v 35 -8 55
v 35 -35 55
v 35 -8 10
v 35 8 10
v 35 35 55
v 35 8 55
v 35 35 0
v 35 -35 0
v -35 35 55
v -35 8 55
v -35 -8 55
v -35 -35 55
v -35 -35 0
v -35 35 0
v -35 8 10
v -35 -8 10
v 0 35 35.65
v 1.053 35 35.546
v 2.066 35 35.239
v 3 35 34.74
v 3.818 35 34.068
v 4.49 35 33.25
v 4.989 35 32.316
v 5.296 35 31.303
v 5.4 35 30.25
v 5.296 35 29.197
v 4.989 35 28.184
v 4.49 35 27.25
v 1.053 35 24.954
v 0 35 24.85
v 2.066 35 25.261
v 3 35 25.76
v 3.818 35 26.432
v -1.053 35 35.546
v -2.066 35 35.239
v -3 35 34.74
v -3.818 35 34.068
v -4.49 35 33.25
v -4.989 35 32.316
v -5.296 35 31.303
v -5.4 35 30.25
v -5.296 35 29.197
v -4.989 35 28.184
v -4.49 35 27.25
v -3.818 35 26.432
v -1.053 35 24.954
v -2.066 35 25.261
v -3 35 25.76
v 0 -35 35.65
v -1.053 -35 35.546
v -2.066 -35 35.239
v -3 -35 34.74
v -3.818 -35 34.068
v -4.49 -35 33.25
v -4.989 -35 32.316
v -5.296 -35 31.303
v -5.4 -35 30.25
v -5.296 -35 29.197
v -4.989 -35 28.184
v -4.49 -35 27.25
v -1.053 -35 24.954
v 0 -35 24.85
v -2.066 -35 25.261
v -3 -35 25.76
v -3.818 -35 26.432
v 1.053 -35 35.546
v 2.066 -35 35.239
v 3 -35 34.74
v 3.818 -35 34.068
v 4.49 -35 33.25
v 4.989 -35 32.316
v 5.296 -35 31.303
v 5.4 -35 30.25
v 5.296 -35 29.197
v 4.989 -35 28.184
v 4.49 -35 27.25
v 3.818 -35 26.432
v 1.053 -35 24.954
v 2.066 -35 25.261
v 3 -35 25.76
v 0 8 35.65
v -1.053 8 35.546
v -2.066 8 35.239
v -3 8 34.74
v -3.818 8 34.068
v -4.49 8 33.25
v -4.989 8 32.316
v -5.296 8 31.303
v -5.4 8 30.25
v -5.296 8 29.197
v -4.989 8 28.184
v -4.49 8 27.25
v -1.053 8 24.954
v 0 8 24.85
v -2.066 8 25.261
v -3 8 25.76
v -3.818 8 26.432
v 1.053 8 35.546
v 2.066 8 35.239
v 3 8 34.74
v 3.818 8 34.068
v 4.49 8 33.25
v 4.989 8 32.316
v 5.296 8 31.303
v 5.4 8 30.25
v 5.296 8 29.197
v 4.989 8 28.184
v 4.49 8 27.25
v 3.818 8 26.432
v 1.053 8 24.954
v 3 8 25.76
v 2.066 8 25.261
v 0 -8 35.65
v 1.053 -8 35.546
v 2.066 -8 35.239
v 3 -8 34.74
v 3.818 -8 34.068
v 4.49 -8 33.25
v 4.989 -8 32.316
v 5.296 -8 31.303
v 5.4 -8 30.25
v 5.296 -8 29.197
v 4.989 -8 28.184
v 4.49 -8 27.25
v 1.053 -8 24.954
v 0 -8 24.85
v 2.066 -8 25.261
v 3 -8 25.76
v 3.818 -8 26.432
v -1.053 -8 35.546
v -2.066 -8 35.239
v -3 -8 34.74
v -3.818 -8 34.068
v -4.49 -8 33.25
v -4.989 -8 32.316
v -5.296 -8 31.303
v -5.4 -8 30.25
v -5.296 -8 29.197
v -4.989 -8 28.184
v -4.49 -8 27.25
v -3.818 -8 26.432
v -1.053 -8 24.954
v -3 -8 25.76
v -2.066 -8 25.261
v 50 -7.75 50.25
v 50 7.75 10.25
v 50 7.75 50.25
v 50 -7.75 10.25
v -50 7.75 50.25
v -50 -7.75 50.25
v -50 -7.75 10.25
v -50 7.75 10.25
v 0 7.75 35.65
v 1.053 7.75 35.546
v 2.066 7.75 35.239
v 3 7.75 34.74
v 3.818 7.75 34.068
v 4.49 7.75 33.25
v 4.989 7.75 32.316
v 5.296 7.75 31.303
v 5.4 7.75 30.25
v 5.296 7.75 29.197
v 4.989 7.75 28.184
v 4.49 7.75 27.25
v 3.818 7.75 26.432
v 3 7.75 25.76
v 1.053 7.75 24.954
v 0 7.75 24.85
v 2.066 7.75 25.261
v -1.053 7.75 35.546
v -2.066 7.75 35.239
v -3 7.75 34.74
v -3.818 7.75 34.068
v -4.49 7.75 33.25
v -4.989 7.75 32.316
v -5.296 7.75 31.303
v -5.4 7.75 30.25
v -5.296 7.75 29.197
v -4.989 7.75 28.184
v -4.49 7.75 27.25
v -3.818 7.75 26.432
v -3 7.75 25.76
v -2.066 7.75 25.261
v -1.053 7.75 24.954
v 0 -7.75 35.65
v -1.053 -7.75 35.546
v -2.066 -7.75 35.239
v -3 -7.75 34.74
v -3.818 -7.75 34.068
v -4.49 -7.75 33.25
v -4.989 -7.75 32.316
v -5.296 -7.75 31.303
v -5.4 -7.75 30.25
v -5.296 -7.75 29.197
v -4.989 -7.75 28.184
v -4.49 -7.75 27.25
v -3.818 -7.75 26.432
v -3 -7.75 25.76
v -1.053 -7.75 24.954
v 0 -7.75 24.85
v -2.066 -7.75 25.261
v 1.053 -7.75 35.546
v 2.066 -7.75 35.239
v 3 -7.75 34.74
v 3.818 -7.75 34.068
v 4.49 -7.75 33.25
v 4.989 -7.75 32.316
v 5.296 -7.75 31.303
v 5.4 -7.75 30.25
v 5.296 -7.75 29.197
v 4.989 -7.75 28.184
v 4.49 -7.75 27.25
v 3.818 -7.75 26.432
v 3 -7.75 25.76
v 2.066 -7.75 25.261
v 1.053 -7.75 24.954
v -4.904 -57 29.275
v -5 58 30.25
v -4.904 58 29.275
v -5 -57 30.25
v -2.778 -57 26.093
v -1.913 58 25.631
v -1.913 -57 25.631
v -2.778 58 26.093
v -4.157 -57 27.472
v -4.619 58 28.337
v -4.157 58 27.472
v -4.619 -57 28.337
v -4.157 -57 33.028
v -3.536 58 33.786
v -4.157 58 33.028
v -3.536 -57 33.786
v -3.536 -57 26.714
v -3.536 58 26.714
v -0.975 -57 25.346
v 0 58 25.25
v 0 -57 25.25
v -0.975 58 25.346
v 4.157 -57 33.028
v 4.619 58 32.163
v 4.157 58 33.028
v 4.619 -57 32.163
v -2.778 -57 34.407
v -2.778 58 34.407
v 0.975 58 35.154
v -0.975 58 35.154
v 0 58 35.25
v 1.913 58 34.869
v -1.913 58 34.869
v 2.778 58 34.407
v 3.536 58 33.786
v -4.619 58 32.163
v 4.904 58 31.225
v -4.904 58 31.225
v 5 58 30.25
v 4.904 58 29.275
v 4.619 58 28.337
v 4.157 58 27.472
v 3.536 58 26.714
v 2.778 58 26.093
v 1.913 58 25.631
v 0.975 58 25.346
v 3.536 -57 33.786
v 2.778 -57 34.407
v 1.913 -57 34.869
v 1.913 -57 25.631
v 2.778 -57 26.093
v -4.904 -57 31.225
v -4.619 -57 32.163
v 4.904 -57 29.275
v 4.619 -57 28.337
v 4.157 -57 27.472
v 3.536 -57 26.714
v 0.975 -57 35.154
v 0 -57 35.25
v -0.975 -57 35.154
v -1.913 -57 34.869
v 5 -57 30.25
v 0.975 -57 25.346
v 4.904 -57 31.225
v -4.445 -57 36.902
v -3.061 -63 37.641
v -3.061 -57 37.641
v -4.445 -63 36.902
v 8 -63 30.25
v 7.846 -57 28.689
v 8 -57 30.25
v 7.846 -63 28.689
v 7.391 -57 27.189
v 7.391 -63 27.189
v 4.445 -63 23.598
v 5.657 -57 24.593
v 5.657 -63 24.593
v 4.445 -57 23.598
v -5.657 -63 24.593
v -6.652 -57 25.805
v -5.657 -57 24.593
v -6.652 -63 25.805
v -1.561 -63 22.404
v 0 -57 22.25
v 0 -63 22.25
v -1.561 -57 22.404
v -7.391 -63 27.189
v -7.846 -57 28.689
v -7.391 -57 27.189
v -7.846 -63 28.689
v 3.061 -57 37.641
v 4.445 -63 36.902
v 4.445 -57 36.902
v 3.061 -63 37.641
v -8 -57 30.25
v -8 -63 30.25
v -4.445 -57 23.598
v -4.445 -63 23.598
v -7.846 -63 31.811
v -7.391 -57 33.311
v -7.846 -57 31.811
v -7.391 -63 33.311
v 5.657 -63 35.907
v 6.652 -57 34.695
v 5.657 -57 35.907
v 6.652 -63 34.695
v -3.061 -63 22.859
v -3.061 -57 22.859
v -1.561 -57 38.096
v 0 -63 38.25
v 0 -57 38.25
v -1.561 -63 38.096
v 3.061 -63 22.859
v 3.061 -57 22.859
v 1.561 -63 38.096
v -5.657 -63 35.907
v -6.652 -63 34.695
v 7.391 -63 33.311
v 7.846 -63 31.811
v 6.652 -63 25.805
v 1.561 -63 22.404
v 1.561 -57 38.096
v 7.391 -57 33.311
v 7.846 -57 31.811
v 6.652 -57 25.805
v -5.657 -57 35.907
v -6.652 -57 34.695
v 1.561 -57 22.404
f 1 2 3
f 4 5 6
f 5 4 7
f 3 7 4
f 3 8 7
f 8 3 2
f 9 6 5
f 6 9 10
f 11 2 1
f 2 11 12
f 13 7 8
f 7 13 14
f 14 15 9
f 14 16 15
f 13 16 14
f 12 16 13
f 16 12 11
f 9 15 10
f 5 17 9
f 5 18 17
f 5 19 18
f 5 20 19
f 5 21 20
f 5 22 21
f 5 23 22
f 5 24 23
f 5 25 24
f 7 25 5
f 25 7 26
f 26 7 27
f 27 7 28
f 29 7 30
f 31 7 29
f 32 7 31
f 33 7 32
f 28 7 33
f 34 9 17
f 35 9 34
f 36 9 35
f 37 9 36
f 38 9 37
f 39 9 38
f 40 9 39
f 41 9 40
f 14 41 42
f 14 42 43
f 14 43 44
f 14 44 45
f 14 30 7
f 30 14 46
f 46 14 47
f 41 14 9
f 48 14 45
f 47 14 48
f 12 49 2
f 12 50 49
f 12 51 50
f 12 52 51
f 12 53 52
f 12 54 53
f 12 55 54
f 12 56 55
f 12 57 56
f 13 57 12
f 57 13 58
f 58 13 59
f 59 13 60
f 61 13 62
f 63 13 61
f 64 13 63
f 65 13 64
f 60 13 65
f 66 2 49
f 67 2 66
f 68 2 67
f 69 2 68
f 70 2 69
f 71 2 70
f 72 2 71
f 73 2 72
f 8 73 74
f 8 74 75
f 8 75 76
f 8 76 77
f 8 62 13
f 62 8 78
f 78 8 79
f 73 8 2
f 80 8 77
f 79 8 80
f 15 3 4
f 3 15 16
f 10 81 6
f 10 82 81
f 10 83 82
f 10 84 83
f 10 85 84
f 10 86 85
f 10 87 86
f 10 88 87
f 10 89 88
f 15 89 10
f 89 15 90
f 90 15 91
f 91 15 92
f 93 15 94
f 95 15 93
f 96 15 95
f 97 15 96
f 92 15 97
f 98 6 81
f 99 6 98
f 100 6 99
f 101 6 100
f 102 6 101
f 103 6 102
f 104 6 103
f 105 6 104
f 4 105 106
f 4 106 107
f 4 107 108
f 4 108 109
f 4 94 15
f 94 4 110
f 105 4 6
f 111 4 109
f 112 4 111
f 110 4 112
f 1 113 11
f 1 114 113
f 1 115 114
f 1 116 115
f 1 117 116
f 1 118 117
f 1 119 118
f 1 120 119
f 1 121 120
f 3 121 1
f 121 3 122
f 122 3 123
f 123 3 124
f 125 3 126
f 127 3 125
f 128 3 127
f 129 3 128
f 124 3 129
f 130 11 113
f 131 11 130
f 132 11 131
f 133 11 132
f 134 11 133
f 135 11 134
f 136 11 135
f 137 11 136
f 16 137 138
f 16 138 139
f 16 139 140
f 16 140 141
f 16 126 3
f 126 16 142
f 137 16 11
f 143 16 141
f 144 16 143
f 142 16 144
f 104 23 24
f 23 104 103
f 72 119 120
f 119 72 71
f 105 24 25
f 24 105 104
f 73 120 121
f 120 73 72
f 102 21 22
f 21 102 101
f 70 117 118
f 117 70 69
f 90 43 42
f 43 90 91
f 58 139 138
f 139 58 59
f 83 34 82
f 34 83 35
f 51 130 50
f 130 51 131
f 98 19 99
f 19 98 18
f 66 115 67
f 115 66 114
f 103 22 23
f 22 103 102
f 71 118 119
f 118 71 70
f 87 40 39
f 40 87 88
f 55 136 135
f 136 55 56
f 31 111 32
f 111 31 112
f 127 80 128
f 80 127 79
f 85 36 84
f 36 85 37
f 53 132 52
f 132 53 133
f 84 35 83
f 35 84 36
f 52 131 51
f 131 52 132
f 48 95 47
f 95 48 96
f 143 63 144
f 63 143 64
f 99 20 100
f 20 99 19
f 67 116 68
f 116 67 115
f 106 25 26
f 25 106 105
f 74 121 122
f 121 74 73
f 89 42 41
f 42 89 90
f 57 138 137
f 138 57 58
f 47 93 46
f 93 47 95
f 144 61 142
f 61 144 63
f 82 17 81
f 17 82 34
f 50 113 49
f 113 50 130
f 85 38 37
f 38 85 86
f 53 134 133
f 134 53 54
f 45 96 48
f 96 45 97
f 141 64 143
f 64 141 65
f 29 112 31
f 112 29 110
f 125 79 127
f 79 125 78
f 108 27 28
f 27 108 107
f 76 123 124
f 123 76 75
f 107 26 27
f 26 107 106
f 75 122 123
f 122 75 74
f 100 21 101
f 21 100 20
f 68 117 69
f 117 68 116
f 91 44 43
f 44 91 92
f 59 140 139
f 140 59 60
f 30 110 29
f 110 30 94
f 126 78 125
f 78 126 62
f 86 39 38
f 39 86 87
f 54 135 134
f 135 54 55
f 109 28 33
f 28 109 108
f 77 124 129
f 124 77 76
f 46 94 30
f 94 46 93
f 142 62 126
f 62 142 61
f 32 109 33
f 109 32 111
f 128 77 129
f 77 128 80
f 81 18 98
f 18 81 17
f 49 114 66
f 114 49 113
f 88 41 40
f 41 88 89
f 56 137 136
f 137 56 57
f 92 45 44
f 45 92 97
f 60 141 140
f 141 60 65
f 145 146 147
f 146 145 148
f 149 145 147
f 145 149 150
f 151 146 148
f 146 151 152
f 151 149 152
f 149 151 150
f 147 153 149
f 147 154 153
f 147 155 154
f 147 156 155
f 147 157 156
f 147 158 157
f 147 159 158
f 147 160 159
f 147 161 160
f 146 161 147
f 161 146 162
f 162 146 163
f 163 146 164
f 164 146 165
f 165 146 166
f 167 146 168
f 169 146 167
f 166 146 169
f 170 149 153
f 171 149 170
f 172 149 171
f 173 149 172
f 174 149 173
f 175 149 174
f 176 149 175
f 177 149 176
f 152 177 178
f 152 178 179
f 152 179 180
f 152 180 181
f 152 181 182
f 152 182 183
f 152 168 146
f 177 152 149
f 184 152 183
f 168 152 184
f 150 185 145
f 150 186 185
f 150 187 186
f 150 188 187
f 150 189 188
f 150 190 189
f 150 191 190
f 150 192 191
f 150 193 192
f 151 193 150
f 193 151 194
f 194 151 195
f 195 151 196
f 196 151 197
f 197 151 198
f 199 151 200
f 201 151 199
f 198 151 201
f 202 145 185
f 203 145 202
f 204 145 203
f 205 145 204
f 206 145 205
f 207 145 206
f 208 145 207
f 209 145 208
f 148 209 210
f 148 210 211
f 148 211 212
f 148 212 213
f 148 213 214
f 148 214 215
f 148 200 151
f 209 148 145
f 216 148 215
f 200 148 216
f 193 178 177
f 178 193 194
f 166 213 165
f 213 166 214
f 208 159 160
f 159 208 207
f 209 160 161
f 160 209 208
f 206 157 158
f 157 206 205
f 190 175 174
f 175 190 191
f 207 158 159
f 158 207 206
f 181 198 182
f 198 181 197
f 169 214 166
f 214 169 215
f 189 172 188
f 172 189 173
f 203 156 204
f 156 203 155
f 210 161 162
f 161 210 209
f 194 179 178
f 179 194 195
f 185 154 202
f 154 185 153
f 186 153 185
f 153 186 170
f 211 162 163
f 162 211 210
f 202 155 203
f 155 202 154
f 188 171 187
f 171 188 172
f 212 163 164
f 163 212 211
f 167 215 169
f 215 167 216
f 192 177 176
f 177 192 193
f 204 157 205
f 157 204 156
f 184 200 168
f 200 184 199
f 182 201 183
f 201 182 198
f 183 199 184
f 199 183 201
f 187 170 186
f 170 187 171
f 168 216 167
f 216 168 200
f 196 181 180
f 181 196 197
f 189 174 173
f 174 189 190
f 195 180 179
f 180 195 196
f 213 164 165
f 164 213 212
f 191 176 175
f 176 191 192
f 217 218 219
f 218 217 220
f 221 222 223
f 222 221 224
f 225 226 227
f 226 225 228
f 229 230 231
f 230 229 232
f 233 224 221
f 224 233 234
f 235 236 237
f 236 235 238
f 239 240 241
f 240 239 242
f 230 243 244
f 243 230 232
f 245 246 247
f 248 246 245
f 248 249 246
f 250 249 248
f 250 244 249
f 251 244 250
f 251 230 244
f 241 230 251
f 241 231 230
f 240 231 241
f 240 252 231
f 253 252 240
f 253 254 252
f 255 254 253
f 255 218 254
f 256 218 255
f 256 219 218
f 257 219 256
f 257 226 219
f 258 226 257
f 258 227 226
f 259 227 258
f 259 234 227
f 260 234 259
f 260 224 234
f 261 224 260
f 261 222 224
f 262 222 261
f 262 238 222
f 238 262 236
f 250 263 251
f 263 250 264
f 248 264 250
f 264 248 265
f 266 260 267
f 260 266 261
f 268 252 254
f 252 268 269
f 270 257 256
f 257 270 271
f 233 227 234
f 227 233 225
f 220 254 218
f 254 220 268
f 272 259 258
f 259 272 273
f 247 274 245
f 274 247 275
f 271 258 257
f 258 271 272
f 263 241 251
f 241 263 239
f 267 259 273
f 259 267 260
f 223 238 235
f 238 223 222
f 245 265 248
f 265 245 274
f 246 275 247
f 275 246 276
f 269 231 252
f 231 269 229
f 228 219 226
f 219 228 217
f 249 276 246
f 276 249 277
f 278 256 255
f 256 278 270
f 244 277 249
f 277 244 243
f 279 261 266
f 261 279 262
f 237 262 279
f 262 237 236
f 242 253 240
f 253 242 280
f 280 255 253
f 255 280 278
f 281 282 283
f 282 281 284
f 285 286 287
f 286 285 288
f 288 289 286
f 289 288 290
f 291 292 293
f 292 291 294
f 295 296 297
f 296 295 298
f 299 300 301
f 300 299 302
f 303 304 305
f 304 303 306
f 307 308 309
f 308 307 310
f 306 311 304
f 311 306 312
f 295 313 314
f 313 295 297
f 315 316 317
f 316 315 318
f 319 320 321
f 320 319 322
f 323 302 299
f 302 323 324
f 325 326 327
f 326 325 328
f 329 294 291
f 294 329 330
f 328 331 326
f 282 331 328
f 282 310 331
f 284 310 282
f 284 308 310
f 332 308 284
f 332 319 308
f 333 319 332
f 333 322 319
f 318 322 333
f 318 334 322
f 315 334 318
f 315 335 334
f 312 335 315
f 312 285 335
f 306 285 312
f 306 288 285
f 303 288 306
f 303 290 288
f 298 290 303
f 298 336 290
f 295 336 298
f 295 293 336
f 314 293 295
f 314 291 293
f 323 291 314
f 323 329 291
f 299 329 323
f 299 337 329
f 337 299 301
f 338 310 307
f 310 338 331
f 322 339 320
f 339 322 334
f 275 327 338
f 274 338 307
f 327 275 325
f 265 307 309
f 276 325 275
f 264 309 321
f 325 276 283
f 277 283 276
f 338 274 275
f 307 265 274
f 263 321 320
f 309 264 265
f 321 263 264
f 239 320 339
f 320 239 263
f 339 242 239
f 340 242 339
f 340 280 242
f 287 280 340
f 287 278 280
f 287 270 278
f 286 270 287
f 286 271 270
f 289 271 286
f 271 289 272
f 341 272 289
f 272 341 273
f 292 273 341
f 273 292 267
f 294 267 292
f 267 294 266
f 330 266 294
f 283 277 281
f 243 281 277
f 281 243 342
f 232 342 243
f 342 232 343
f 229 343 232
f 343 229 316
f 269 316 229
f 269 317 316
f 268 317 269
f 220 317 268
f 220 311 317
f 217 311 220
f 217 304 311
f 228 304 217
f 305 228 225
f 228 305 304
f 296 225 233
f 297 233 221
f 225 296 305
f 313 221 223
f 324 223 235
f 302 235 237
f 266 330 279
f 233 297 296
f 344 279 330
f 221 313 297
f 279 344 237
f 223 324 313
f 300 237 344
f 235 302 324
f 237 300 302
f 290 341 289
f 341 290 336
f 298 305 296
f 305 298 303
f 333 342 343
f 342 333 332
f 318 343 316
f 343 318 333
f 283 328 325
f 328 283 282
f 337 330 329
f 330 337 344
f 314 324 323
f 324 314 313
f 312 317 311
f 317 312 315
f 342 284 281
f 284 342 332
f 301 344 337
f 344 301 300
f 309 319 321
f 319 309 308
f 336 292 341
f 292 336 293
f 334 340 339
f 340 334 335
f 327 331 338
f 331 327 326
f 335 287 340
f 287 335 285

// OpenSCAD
$fn = 32;

// ------------------------------------------------------------------------
// Clevis joint: 70 mm clevis, pin d10
// Every part is its own module, assembly() places them once.
// ------------------------------------------------------------------------

// --- part 1 ---
module clevis() {
  difference() {
    translate([-35, -35, 0]) cube([70, 70, 55]);
    translate([-36, -8, 10]) cube([72, 16, 46]);
    translate([0, 0, 30.25]) rotate([90, 0, 0]) cylinder(h = 72, d = 10.8, center = true);
  }
}

// --- part 2 ---
module eye() {
  difference() {
    translate([-50, -7.75, 0]) cube([100, 15.5, 40]);
    translate([0, 0, 20]) rotate([90, 0, 0]) cylinder(h = 17.5, d = 10.8, center = true);
  }
}

// --- part 3 ---
module pin() {
  rotate([0, 90, 0]) cylinder(h = 116, d = 10, center = true);
  translate([-63, 0, 0]) rotate([0, 90, 0]) cylinder(h = 6, d = 16);
}

// --- assembly ---
module assembly() {
  translate([0, 0, 0]) rotate([0, 0, 0]) clevis();
  translate([0, 0, 10.25]) rotate([0, 0, 0]) eye();
  translate([0, 0, 30.25]) rotate([0, 0, 90]) pin();
}

assembly();
